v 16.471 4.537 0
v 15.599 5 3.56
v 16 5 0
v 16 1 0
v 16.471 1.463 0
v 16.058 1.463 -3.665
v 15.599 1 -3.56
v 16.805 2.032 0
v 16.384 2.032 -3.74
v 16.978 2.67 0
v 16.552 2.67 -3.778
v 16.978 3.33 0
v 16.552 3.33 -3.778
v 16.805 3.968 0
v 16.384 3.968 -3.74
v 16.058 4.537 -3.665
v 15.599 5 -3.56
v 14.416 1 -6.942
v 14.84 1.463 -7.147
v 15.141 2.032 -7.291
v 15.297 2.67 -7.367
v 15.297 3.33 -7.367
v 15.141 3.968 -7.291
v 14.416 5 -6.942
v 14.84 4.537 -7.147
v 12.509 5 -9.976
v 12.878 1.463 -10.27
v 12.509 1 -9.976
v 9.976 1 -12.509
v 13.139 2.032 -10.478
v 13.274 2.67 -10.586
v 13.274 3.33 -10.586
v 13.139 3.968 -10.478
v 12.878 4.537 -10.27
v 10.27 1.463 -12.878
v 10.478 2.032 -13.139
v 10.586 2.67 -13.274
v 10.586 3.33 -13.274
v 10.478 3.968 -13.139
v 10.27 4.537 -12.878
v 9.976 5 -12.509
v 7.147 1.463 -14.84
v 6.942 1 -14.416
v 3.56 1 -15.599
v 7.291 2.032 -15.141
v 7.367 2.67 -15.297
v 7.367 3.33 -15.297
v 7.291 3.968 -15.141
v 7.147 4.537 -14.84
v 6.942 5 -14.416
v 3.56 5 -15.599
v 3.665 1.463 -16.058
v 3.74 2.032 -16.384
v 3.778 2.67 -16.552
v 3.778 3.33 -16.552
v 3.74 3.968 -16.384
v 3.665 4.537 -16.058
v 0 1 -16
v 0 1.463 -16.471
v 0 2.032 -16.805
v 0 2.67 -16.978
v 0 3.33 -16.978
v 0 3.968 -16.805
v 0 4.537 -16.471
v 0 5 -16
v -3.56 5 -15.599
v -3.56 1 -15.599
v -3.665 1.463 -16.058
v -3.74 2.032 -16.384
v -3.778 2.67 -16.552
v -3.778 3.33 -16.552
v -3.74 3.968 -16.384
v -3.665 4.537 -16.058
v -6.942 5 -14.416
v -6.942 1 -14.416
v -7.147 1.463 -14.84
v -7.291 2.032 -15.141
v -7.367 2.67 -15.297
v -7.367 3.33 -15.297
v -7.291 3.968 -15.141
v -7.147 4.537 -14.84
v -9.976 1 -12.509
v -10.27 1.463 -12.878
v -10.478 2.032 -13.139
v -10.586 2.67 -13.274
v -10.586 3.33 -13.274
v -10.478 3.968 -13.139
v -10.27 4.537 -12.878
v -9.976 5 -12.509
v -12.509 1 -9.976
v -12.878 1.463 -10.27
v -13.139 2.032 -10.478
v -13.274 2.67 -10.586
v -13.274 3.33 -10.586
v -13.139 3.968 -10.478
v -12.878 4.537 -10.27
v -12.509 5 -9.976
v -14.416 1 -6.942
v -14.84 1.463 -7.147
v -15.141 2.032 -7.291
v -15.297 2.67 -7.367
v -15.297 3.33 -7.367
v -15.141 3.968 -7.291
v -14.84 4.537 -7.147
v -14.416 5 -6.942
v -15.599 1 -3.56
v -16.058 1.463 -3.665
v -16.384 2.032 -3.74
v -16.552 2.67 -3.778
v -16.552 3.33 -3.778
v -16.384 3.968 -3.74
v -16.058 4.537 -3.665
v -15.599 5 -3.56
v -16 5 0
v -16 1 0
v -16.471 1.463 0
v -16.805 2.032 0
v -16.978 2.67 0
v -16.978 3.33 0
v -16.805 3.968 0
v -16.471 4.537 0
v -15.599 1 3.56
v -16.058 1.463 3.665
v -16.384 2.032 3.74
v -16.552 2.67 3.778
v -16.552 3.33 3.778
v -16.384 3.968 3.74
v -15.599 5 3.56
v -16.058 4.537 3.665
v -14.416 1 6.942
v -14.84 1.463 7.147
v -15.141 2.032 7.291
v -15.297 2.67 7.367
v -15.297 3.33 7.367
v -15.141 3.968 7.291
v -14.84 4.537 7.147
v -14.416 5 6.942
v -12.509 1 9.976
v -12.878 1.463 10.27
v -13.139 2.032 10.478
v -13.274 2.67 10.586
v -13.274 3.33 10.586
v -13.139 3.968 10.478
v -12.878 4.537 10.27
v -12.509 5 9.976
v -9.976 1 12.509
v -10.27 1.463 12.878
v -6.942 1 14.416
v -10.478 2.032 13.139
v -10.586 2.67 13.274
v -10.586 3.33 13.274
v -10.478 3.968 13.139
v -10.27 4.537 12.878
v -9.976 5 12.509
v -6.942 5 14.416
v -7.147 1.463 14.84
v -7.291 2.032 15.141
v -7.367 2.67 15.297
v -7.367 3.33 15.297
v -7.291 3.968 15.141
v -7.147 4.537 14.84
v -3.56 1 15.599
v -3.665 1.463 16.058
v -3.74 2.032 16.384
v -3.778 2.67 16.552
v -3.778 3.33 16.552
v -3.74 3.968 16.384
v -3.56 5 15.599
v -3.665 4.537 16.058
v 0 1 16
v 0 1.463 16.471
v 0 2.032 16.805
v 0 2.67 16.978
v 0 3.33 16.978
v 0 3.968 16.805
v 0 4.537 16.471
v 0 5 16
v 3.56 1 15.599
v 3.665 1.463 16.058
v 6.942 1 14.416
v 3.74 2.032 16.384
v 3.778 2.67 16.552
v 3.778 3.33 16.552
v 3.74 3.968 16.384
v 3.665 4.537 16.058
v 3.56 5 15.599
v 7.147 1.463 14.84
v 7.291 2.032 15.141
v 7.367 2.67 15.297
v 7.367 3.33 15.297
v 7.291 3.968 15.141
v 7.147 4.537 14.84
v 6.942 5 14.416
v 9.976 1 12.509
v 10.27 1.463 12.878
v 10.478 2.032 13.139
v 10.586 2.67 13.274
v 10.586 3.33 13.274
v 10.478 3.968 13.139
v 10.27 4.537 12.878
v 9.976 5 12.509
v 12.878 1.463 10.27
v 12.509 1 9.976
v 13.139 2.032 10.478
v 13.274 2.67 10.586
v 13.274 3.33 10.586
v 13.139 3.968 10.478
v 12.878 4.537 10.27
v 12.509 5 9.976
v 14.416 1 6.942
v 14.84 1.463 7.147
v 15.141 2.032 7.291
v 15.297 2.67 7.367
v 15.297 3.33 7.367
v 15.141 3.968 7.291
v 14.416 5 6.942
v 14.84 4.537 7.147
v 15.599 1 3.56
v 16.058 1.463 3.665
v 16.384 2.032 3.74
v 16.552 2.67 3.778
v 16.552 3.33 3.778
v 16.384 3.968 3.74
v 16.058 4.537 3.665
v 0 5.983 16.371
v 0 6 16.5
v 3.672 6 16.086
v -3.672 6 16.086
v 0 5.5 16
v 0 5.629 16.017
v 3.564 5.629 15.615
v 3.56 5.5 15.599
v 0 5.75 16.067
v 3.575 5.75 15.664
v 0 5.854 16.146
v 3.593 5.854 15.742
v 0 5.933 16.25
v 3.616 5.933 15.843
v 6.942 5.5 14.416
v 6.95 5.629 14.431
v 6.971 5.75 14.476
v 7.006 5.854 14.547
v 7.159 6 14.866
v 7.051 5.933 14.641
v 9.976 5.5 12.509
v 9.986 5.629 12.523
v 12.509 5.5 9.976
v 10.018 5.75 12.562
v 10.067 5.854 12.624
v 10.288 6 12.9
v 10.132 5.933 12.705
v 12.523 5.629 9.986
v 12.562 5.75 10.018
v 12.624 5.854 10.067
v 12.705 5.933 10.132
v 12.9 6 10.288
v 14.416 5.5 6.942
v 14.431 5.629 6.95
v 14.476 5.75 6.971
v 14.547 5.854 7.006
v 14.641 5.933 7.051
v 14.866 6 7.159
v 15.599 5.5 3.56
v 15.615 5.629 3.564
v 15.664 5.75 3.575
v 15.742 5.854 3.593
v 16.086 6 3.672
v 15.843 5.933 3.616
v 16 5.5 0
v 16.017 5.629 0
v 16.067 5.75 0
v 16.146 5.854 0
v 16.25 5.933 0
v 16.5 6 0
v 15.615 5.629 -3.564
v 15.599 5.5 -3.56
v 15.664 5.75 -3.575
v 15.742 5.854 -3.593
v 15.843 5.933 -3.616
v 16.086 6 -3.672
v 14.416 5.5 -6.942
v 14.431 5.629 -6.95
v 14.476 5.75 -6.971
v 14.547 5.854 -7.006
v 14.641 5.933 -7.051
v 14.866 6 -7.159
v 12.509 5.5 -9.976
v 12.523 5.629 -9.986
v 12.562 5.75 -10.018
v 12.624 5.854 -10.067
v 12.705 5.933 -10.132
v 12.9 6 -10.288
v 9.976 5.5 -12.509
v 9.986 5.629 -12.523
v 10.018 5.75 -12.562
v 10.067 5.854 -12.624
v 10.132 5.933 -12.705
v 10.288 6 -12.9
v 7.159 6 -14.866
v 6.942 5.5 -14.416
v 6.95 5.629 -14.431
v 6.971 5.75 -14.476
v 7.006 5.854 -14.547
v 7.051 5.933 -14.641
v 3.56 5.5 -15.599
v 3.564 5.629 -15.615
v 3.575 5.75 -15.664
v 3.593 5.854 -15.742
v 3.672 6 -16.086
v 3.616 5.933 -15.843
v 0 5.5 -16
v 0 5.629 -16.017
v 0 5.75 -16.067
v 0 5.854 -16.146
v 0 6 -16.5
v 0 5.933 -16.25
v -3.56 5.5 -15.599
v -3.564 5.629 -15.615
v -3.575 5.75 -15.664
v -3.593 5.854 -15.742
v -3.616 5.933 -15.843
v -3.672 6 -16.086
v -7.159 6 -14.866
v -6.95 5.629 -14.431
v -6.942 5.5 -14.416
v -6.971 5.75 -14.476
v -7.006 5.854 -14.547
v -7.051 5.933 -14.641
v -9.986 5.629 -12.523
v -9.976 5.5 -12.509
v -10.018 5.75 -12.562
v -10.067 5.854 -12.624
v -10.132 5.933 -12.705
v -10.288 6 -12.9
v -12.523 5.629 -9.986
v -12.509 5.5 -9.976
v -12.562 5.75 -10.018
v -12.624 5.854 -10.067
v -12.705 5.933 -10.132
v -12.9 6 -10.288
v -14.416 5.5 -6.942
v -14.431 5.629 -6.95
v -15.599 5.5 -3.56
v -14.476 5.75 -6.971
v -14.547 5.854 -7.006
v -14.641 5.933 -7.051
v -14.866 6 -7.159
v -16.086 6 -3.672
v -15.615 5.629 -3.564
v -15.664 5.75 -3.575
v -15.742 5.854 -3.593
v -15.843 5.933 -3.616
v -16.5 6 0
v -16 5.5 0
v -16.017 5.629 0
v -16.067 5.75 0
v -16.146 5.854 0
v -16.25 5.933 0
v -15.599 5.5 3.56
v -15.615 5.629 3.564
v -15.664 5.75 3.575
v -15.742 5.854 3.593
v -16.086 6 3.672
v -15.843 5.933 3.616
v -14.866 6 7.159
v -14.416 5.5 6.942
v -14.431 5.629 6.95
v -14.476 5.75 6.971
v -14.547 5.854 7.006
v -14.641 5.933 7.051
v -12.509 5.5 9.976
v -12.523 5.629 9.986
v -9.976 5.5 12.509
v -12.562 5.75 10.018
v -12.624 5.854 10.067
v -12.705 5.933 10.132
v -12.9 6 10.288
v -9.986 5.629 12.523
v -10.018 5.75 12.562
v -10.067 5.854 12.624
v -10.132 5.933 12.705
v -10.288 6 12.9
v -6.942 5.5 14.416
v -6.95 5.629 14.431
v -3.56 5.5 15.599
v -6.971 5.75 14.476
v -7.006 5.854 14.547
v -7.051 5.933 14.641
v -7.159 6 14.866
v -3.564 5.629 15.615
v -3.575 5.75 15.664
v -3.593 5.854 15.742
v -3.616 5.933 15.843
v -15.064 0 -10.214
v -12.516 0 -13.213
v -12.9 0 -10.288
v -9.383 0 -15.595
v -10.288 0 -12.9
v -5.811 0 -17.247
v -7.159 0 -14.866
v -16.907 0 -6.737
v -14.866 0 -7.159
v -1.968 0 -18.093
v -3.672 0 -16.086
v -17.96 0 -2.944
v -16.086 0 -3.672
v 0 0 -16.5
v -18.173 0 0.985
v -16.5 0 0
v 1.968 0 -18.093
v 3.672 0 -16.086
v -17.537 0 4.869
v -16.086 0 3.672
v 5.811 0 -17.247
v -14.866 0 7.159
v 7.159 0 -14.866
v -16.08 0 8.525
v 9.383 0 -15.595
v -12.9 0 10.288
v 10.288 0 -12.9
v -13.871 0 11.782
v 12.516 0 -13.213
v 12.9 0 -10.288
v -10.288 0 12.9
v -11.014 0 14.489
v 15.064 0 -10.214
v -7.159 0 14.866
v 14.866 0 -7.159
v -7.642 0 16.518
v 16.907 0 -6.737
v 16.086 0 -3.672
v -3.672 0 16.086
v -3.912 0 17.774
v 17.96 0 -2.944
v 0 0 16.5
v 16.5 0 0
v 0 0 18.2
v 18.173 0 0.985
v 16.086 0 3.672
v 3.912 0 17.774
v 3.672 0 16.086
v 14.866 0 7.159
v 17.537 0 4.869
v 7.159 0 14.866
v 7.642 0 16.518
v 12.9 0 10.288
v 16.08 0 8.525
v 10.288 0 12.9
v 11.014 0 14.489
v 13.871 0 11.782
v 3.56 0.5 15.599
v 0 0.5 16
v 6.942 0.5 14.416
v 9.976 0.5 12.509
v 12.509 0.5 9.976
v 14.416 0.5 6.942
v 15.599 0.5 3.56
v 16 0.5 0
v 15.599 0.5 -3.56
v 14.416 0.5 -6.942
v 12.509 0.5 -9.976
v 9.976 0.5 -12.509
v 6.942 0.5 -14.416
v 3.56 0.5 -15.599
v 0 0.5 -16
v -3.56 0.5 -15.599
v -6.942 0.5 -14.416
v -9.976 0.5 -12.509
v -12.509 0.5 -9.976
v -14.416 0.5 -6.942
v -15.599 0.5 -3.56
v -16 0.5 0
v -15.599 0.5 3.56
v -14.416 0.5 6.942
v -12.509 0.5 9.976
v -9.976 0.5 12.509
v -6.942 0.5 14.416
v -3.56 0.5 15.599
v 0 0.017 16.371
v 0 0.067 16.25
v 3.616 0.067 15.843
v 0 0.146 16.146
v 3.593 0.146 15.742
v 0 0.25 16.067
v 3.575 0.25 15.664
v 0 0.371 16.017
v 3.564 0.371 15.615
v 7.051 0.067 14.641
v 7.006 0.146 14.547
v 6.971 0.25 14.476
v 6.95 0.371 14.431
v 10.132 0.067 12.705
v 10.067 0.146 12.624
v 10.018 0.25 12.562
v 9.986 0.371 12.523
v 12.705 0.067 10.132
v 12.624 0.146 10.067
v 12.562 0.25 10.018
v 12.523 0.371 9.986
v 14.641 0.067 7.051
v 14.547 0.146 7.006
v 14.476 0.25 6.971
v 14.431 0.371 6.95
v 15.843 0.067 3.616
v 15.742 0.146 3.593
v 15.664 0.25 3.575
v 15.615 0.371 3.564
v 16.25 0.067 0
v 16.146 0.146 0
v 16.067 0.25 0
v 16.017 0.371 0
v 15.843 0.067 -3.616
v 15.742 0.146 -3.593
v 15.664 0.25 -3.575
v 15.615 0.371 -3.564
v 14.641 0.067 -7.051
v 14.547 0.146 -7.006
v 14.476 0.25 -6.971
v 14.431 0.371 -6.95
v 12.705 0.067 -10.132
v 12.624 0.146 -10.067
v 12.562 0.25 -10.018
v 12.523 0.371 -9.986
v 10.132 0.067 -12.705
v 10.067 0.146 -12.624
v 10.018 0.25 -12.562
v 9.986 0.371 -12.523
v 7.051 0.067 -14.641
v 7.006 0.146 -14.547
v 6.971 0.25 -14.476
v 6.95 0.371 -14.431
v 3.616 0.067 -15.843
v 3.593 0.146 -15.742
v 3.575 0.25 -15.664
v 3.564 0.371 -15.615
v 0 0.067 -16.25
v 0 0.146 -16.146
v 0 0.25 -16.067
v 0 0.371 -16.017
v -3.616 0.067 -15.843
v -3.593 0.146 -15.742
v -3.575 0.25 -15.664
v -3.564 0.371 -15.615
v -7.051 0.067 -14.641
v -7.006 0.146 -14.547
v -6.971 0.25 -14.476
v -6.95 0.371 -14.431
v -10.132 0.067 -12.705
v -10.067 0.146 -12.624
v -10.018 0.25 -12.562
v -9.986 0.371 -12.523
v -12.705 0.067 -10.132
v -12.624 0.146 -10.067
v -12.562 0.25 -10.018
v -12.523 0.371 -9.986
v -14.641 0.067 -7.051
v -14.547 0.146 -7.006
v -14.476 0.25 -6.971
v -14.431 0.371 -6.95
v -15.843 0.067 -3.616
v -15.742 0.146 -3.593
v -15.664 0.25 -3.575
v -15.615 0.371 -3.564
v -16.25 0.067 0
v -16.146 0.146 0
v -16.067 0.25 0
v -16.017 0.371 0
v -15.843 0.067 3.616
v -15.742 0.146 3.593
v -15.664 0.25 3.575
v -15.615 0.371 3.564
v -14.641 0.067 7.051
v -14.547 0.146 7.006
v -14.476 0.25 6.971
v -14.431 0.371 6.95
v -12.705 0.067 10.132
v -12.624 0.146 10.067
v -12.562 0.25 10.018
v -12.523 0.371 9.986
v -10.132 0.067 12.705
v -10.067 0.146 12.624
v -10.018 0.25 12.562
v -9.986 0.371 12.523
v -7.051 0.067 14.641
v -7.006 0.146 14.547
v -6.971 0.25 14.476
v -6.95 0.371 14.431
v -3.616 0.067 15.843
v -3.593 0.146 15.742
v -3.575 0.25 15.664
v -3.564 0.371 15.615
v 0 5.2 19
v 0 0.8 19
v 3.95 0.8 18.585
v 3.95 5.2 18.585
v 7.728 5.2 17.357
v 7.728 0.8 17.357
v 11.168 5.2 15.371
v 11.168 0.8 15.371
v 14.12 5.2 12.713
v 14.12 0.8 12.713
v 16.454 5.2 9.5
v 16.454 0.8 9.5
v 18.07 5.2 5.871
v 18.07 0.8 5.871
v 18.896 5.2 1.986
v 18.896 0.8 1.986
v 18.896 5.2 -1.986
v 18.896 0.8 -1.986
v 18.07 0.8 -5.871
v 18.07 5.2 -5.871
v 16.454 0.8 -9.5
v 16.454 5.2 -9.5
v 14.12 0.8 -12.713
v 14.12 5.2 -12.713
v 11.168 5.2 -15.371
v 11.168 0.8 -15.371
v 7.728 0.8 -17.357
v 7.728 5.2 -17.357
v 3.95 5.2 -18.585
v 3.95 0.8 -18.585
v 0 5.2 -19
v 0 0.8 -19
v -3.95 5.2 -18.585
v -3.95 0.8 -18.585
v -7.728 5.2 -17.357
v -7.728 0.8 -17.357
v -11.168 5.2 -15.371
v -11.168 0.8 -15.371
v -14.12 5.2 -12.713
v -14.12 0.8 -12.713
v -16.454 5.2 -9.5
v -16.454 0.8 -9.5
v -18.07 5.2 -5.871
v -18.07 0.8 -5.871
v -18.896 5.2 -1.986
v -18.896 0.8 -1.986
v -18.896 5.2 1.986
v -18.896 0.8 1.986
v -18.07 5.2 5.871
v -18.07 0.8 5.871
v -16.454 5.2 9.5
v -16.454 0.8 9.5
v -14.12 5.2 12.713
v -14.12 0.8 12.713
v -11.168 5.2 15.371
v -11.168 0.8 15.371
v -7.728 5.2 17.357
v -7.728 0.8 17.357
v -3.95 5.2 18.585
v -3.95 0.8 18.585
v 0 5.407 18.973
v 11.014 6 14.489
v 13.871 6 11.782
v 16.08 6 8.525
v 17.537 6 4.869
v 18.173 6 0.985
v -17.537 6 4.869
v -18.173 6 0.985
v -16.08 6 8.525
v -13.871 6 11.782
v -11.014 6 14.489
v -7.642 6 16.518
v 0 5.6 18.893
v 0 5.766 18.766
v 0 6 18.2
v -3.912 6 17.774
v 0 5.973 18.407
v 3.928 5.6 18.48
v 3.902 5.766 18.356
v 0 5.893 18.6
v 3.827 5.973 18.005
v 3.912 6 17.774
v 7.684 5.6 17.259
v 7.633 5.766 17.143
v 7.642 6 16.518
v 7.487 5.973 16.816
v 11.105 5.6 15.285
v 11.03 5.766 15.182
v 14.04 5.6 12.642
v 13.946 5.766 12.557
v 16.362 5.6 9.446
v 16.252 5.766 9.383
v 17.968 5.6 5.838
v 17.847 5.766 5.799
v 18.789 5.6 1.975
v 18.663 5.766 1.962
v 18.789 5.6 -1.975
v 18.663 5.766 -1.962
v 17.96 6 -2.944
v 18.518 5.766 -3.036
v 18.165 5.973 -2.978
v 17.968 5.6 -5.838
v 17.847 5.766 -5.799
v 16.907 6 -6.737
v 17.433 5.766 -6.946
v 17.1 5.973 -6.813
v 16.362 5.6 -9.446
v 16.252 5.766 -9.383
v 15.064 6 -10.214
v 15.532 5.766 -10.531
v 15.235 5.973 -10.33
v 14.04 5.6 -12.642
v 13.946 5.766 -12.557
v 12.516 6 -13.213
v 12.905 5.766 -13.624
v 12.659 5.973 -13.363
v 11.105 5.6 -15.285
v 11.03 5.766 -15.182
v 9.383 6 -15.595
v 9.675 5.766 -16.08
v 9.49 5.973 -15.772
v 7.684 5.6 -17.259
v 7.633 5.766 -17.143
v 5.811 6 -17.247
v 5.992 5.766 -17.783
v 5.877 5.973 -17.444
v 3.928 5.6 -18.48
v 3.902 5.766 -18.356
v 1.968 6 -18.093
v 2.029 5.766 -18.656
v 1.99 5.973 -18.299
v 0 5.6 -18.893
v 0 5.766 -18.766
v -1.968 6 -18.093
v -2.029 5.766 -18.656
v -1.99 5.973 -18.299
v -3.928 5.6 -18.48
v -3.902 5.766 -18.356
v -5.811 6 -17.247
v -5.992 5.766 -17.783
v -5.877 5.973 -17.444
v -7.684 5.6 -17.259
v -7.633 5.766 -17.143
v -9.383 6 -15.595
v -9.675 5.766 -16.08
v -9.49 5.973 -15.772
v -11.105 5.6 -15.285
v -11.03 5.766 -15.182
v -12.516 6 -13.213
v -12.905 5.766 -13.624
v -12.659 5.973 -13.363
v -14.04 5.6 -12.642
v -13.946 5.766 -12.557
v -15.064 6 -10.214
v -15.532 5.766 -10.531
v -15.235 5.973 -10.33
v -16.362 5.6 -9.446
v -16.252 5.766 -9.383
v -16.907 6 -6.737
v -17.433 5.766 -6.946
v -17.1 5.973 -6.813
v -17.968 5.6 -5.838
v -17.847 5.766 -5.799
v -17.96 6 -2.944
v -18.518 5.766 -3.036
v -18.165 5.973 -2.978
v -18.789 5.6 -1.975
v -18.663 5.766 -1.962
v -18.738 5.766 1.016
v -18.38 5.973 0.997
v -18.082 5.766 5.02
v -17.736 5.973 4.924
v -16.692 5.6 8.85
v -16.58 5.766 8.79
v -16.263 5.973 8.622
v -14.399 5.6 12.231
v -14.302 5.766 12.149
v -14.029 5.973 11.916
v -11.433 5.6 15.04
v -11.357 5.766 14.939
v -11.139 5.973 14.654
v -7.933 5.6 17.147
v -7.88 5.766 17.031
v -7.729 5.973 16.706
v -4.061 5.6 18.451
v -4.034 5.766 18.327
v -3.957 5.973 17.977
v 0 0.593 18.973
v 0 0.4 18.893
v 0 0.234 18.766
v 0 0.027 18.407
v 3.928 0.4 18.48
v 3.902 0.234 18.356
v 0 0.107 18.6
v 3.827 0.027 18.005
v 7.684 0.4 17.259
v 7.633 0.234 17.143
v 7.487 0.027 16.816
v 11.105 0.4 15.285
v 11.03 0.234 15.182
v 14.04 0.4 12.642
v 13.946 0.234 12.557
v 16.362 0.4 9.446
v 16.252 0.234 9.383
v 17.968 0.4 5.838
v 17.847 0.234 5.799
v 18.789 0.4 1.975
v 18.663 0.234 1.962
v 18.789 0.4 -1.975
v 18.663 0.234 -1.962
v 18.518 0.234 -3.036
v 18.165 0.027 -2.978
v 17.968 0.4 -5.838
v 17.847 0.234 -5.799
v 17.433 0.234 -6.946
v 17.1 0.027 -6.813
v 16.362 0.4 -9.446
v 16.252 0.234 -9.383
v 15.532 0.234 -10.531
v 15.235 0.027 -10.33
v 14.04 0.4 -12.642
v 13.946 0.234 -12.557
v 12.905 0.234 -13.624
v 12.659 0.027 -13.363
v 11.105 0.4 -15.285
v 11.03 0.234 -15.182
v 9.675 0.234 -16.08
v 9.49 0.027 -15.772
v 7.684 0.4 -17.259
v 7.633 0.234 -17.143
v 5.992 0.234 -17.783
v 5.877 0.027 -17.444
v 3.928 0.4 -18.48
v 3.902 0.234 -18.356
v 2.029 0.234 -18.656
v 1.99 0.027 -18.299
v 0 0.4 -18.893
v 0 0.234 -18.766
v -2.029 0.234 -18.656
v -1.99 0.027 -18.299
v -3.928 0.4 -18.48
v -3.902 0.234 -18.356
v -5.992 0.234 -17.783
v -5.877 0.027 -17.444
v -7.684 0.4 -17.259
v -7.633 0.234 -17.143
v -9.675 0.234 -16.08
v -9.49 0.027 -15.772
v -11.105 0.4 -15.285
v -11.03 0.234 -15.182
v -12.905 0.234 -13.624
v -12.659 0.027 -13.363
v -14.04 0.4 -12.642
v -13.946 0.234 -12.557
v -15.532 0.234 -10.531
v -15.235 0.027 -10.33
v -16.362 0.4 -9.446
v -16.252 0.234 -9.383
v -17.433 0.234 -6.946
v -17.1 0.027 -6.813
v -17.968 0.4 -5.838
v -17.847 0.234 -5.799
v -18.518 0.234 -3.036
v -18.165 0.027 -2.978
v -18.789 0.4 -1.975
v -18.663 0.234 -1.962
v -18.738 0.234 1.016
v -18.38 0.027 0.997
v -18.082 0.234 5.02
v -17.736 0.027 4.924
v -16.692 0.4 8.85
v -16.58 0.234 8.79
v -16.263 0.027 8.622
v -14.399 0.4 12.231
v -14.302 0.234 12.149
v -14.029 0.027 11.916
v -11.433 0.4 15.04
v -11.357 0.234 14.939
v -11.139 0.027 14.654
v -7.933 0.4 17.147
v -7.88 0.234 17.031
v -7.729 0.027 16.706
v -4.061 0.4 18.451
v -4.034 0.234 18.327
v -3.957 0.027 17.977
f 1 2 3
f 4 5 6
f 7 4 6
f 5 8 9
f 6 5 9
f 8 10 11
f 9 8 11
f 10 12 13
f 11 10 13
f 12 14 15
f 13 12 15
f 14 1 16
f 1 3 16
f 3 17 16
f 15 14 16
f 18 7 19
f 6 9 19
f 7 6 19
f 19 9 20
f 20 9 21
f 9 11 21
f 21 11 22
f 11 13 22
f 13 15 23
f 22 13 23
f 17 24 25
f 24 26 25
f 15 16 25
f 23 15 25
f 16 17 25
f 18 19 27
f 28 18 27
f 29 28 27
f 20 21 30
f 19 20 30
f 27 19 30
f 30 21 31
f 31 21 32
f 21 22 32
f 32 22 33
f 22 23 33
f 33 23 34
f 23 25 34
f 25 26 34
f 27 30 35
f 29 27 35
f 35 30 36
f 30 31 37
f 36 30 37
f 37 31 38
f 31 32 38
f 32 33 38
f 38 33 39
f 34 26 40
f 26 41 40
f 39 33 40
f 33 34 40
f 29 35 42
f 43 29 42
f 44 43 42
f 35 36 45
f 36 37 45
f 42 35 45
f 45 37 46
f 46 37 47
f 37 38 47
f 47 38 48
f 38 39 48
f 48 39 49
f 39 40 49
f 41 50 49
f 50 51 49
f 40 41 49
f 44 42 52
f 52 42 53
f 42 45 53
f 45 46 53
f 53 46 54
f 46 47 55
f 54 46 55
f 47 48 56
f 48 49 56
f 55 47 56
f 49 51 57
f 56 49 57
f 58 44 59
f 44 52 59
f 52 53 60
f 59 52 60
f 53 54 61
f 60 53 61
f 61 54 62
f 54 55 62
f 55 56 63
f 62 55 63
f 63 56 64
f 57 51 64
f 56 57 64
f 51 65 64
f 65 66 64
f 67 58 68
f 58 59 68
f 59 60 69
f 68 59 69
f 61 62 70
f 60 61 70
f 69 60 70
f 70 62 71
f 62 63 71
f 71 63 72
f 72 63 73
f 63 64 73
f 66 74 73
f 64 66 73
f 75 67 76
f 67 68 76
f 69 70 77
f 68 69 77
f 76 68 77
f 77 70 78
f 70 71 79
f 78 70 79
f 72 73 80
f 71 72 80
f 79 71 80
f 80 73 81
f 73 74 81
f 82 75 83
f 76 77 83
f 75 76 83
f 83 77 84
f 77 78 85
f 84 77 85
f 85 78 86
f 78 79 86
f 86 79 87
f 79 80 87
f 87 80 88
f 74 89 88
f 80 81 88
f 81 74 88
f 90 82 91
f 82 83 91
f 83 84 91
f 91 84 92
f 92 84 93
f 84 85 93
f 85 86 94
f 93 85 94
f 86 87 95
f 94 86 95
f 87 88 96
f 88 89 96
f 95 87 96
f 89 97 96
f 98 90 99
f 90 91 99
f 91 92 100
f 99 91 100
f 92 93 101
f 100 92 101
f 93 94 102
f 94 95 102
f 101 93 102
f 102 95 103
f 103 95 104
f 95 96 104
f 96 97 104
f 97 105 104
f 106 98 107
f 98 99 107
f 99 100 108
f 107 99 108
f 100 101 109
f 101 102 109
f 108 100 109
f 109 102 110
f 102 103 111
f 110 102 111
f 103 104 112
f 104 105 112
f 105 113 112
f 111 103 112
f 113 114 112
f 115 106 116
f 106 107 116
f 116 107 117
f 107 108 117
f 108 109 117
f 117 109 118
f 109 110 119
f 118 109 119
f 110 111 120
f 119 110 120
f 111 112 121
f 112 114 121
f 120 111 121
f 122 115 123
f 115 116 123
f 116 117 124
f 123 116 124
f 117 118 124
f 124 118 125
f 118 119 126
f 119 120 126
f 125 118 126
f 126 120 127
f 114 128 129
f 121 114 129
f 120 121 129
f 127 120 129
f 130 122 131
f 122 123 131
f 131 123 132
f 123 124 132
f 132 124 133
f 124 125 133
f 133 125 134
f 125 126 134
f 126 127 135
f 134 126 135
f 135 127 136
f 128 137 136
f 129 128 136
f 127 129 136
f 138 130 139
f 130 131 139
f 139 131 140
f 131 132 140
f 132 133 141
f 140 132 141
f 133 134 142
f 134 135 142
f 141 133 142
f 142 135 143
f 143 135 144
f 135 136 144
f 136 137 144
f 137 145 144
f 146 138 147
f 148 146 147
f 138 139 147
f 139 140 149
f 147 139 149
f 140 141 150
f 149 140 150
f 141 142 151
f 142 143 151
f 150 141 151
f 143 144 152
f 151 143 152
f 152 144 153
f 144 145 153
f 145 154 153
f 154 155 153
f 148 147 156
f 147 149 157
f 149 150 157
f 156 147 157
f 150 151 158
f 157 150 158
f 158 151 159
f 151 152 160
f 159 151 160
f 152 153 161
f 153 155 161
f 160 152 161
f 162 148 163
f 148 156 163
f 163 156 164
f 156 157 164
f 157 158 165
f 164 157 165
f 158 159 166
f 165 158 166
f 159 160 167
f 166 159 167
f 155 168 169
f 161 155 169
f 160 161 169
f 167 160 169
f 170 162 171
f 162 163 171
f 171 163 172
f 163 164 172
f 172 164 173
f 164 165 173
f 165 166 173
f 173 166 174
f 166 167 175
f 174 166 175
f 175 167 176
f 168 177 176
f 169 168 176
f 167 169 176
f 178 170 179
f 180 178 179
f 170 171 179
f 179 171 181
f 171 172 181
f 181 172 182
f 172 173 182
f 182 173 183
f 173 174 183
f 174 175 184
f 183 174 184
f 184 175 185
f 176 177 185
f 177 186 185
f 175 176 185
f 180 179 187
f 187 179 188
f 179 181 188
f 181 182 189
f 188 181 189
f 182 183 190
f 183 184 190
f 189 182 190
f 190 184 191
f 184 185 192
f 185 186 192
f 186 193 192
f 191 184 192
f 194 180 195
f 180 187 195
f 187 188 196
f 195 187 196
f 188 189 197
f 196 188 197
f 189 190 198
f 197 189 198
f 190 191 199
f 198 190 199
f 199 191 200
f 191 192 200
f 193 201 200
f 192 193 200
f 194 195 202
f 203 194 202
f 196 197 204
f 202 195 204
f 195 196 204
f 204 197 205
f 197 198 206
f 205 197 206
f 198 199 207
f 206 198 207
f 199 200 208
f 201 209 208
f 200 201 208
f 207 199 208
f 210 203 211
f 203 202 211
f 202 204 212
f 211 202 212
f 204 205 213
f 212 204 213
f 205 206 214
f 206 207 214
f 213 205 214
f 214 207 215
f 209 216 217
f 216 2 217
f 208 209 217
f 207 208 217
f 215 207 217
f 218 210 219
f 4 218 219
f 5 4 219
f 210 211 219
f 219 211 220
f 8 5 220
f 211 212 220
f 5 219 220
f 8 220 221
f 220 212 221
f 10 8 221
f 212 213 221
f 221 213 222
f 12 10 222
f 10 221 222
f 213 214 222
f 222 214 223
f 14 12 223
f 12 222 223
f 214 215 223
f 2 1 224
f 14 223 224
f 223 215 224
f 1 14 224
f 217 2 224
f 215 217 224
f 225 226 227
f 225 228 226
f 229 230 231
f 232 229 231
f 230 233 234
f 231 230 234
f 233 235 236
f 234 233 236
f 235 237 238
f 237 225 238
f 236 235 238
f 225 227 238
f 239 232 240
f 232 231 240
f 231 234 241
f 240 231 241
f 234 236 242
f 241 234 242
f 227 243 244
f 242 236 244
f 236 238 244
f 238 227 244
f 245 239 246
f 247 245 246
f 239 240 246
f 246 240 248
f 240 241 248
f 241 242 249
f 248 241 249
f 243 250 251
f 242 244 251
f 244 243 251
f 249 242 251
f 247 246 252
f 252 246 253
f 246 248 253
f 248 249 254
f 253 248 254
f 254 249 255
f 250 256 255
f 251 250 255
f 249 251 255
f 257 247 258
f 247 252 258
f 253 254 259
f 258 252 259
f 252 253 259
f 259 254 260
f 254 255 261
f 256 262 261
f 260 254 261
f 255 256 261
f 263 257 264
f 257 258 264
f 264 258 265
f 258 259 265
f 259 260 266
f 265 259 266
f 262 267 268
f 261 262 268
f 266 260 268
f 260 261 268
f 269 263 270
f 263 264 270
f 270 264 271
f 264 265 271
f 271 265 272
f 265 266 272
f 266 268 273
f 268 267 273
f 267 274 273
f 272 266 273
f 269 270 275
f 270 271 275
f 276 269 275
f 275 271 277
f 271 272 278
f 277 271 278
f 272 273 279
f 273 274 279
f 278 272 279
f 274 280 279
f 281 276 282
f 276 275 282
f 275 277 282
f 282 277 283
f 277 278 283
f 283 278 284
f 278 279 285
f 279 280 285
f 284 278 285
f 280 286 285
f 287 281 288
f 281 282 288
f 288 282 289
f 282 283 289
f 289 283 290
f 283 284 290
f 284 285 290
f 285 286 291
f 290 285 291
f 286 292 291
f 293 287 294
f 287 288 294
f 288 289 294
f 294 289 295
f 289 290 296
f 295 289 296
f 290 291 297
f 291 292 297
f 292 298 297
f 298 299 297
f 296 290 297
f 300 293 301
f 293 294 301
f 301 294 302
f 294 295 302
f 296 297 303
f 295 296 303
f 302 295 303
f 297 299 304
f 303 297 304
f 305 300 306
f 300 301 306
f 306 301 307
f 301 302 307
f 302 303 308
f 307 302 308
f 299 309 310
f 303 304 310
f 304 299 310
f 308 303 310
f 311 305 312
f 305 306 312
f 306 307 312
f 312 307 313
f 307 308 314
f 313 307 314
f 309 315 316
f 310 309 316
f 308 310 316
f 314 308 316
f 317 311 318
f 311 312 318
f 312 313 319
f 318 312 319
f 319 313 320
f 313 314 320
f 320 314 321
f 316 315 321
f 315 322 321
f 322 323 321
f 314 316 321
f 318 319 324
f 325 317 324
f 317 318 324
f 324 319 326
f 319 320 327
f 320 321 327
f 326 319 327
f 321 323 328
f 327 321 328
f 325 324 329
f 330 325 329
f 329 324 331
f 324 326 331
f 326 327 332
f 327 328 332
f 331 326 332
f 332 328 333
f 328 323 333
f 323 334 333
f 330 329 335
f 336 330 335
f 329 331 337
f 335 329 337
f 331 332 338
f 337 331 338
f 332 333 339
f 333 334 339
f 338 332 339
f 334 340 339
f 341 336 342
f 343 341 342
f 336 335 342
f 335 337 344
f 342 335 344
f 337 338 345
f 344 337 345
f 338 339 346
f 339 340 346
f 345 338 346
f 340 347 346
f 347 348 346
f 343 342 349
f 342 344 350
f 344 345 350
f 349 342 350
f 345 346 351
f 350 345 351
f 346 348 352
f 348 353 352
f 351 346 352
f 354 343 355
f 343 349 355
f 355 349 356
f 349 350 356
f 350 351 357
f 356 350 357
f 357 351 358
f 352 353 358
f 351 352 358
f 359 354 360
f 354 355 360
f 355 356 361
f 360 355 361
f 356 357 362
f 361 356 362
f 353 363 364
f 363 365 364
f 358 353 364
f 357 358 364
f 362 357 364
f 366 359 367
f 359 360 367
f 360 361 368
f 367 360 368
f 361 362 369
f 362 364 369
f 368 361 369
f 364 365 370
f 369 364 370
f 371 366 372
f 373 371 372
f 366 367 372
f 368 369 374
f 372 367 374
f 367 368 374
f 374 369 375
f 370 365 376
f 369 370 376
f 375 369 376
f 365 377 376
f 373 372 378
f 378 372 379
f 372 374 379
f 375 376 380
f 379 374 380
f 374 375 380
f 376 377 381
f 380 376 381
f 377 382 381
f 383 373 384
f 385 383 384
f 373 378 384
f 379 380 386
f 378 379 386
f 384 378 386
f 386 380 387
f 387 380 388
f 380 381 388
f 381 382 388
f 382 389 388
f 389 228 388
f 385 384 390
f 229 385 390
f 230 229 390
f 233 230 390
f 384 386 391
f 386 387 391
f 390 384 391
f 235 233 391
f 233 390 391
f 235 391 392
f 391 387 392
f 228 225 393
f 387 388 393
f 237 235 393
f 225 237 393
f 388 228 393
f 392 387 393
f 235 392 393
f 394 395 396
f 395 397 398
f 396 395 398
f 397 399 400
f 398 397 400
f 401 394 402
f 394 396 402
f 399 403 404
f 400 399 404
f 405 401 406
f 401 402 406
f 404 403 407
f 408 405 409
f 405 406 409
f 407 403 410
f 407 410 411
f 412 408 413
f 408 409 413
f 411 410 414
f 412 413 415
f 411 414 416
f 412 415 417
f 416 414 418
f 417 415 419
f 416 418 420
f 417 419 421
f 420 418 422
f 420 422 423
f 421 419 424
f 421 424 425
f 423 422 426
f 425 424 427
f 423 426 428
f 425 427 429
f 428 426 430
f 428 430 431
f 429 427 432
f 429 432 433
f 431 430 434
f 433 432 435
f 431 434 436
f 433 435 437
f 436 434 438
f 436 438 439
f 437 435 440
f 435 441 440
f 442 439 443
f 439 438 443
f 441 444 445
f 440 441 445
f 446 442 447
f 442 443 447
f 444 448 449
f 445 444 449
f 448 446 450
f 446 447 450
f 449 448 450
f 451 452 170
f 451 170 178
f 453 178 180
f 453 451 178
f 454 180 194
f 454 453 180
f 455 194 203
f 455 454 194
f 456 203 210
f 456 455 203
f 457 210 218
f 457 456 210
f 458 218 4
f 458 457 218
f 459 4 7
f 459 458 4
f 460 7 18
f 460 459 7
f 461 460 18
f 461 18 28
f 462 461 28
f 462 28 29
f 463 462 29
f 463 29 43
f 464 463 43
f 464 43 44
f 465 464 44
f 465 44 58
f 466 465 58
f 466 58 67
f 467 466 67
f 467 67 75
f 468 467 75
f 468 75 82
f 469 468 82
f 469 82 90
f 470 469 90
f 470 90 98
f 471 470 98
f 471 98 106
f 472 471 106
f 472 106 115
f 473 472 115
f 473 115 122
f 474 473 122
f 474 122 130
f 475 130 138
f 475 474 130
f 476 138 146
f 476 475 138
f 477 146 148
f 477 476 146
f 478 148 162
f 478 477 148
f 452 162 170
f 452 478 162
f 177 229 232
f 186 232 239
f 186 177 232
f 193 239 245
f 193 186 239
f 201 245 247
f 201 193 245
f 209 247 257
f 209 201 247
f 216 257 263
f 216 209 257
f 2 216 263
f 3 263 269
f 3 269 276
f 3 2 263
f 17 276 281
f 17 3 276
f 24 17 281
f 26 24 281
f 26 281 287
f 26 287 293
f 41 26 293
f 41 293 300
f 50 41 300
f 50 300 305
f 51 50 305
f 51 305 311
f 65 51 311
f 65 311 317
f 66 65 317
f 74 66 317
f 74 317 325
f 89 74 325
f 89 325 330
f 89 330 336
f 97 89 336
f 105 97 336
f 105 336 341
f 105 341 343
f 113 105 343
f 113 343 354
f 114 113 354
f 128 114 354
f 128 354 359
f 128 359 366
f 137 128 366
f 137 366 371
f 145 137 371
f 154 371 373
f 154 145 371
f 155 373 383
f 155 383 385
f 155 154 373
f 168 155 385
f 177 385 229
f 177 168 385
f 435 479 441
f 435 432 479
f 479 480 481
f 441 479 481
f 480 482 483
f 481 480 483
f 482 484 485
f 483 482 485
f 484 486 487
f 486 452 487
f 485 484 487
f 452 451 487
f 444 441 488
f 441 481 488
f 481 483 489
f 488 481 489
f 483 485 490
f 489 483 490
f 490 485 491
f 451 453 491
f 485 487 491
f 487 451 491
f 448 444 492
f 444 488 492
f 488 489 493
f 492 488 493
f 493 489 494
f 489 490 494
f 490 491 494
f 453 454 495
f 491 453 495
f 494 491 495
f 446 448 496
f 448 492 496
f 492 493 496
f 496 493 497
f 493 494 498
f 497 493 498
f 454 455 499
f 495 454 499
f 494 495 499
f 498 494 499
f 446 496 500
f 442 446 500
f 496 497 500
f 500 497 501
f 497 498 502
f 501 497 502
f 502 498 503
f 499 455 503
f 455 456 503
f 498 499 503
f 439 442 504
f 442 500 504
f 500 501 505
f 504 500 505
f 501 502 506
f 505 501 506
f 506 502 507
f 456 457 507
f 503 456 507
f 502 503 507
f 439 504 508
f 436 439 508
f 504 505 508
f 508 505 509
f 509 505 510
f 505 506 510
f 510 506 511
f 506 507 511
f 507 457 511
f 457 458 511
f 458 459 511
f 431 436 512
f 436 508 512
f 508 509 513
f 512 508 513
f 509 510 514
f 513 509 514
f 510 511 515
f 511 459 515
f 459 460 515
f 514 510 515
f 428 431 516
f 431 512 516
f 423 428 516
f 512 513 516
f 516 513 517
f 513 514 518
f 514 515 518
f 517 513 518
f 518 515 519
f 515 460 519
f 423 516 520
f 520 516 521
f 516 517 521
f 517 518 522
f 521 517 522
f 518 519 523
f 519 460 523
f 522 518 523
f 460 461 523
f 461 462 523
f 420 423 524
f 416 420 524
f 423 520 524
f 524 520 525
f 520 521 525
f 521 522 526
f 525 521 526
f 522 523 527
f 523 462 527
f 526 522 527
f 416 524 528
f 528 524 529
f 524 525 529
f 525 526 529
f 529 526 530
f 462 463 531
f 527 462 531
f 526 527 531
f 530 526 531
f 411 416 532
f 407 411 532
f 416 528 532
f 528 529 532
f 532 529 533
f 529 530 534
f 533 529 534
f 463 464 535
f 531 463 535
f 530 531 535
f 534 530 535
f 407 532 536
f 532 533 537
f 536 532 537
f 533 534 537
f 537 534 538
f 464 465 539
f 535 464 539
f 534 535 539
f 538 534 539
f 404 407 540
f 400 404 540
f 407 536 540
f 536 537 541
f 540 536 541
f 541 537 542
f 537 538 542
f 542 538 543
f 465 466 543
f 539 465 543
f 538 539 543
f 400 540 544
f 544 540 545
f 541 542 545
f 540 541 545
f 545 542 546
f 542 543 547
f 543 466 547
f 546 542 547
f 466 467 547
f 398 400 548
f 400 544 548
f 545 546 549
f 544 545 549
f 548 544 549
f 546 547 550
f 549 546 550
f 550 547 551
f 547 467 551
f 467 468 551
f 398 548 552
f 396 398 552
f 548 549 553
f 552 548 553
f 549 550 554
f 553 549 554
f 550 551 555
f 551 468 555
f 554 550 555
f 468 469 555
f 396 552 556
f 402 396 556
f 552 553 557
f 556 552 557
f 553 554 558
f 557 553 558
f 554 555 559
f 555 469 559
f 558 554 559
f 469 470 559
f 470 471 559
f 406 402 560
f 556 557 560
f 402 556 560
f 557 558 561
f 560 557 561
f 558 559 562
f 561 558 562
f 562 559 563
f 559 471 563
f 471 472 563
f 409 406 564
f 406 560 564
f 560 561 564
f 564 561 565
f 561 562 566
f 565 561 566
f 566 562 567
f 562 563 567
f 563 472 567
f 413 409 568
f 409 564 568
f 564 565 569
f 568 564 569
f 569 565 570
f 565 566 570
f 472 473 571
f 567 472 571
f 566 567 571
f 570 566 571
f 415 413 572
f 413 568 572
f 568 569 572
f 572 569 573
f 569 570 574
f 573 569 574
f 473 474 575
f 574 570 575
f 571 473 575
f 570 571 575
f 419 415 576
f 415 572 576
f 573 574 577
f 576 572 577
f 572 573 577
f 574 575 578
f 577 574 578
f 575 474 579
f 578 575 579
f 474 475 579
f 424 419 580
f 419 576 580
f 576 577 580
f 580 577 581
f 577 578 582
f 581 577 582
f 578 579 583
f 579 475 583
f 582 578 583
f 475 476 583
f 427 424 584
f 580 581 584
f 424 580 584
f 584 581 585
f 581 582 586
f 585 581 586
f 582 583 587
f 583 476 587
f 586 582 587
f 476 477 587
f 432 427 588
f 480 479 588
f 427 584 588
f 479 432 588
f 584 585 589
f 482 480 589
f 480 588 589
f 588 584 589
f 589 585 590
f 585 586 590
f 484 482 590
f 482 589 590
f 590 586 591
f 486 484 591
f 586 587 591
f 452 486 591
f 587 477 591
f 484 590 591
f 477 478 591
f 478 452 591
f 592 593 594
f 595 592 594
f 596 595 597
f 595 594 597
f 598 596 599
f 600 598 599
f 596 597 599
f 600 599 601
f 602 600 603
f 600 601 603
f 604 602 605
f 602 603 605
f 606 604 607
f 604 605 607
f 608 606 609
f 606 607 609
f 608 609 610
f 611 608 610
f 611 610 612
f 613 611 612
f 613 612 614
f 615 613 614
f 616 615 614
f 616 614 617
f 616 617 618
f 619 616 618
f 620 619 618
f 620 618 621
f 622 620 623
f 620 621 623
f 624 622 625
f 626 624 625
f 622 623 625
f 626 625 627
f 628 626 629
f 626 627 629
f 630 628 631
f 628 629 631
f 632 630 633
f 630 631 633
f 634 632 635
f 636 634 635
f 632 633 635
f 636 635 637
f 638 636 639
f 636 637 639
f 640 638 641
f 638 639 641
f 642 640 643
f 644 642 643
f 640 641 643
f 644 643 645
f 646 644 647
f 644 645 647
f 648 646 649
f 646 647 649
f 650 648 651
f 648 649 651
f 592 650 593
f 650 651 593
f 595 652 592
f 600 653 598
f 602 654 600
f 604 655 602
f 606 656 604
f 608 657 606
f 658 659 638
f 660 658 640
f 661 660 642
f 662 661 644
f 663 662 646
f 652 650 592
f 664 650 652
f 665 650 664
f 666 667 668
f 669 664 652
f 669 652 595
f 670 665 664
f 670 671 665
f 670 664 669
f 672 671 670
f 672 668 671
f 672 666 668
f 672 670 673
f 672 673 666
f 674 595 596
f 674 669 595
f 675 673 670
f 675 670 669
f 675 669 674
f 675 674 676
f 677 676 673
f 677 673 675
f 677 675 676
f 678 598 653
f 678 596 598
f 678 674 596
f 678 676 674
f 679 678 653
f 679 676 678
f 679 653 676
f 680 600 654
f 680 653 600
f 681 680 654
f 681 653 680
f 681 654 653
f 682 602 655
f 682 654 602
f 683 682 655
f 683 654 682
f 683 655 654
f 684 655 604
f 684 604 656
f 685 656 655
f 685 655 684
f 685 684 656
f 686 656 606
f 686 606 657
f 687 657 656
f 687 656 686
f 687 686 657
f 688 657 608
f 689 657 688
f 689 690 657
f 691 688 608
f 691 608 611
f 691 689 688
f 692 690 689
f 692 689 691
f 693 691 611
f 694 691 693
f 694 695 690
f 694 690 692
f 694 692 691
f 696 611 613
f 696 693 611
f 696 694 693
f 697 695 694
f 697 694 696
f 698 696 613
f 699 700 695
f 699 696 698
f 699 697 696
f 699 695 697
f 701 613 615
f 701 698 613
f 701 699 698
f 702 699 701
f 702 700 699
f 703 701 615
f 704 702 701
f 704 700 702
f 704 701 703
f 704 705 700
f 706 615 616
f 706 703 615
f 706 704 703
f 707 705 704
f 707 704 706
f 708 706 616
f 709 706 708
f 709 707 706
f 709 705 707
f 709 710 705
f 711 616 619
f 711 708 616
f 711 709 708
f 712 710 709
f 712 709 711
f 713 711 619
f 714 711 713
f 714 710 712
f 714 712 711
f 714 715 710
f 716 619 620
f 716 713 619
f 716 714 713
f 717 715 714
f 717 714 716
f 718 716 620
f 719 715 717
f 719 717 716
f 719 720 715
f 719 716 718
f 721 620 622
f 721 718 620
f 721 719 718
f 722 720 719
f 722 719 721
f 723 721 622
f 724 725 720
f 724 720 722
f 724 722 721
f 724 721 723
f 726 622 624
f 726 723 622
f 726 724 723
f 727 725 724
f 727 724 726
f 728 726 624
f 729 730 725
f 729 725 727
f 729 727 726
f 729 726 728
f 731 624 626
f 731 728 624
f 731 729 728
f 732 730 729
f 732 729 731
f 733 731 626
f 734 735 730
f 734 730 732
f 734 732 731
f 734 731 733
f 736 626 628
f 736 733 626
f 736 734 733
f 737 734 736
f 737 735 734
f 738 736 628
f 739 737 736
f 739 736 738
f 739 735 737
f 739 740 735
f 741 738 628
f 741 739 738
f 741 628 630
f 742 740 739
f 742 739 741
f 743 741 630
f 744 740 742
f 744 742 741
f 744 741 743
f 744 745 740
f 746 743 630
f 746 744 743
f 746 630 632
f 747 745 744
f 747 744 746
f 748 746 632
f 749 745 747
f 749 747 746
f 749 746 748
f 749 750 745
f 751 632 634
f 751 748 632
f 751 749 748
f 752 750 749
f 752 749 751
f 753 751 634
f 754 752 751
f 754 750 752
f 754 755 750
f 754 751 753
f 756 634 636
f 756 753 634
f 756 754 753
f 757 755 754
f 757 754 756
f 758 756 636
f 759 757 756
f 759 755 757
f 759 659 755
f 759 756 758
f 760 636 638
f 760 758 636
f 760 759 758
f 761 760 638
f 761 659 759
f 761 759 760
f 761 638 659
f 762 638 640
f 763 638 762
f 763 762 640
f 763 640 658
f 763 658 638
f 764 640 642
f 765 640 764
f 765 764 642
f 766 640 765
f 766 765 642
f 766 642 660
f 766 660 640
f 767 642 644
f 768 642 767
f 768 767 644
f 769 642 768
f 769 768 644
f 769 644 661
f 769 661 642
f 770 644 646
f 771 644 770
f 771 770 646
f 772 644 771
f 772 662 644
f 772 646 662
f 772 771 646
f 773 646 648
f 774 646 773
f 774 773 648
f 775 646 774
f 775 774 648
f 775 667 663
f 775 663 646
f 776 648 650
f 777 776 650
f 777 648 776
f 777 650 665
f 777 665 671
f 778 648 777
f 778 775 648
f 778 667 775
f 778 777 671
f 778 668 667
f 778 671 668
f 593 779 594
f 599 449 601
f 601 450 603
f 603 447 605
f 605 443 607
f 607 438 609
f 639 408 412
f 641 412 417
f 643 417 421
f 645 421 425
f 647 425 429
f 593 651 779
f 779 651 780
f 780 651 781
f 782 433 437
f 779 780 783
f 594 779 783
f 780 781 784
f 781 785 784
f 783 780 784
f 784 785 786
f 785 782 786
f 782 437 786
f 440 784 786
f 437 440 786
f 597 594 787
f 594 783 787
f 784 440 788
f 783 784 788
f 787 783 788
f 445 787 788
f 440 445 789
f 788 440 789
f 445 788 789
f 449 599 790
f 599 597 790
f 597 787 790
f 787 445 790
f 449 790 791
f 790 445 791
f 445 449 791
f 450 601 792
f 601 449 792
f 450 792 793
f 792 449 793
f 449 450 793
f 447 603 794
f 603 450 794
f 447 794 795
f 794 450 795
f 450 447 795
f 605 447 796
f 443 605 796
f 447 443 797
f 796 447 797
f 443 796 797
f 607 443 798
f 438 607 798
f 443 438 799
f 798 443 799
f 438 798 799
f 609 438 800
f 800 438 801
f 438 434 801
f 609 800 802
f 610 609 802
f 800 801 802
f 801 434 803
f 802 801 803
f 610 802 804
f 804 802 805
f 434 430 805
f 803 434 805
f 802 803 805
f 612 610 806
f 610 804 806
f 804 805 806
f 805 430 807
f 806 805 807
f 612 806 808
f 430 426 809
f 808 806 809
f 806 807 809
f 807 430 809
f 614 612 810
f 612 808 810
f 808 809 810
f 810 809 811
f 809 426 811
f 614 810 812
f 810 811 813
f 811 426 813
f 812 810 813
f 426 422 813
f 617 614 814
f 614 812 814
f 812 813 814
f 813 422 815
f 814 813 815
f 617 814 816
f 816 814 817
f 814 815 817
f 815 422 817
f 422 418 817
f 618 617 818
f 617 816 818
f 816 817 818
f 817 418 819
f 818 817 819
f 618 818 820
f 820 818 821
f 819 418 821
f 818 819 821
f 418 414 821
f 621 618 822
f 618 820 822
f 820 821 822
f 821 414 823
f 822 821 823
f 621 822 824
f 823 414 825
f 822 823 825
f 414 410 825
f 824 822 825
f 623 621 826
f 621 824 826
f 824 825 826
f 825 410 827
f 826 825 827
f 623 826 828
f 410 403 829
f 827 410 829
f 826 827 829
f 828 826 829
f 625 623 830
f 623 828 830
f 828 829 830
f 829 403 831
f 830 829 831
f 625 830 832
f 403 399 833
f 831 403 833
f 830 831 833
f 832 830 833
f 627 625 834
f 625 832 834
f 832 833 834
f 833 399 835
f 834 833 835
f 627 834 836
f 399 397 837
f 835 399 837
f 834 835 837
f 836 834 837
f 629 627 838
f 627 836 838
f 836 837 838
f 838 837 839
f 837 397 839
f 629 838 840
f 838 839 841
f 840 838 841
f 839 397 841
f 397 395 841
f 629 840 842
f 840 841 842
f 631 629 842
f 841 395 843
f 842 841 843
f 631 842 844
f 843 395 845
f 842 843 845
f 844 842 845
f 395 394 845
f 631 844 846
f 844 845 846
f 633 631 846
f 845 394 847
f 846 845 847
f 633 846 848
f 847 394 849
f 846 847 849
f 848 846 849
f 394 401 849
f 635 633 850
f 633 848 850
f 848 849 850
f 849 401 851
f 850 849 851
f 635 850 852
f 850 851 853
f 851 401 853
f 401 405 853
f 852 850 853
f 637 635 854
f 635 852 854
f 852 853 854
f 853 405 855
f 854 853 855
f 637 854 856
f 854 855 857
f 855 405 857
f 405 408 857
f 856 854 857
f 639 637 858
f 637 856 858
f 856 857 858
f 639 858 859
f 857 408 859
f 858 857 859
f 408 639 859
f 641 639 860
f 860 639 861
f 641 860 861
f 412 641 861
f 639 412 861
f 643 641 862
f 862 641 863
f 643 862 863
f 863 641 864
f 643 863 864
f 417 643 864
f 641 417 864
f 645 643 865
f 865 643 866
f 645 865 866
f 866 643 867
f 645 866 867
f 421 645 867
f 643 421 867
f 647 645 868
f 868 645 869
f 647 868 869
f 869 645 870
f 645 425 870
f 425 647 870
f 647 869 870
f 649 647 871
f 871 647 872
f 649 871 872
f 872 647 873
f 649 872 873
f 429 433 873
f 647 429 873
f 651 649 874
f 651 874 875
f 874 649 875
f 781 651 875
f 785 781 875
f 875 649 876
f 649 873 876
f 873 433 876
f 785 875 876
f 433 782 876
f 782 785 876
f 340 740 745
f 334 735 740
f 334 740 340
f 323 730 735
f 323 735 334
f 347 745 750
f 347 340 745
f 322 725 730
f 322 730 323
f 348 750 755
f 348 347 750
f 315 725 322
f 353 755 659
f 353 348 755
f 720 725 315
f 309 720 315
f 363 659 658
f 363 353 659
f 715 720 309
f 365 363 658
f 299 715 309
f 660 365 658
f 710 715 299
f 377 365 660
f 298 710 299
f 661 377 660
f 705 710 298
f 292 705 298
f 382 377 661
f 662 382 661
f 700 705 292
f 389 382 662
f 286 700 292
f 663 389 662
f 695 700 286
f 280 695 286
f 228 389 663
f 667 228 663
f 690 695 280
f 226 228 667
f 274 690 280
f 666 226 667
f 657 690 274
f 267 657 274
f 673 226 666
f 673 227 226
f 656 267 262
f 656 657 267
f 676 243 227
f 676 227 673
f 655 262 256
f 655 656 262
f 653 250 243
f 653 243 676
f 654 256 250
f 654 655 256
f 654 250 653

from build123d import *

# Parameters (mm, degrees)
SKETCH_1_R      = 19
SKETCH_1_R_2    = 16
EXTRUDE_1_DEPTH = 6
FILLET_1_R      = 0.8
FILLET_2_R      = 0.5
FILLET_3_R      = 0.5


# Read off the part's stored shape, not the designer's step: 压凹1
with BuildPart() as part:
    # 草图1 → 凸台-拉伸1 (new body)
    with BuildSketch(Plane(origin=(0, 0, 0), x_dir=(1, 0, 0), z_dir=(0, 1, 0))):
        with Locations(Location((0, 0, 0), (0, 0, 270))):
            Circle(SKETCH_1_R)
        with Locations(Location((0, 0, 0), (0, 0, 270))):
            Circle(SKETCH_1_R_2, mode=Mode.SUBTRACT)
    extrude(amount=EXTRUDE_1_DEPTH)

    # 压凹1 outline → 压凹1 (revolve, cut)
    with BuildSketch(Plane.XY):
        with BuildLine():
            Line((16, 5), (16, 1))
            ThreePointArc((16, 1), (17, 3), (16, 5))
        make_face()
    revolve(axis=Axis((0, 0, 0), (0, 1, 0)), mode=Mode.SUBTRACT)

    # 圆角1
    fillet_1_edges = [part.edges().sort_by_distance(p)[0] for p in [
        (0, 0, -19),
        (0, 6, -19),
    ]]
    fillet(fillet_1_edges, radius=FILLET_1_R)

    # 圆角2
    fillet_2_edges = [part.edges().sort_by_distance(p)[0] for p in [
        (0, 0, -16),
    ]]
    fillet(fillet_2_edges, radius=FILLET_2_R)

    # 圆角3
    fillet_3_edges = [part.edges().sort_by_distance(p)[0] for p in [
        (0, 6, -16),
    ]]
    fillet(fillet_3_edges, radius=FILLET_3_R)


solid = part.part
